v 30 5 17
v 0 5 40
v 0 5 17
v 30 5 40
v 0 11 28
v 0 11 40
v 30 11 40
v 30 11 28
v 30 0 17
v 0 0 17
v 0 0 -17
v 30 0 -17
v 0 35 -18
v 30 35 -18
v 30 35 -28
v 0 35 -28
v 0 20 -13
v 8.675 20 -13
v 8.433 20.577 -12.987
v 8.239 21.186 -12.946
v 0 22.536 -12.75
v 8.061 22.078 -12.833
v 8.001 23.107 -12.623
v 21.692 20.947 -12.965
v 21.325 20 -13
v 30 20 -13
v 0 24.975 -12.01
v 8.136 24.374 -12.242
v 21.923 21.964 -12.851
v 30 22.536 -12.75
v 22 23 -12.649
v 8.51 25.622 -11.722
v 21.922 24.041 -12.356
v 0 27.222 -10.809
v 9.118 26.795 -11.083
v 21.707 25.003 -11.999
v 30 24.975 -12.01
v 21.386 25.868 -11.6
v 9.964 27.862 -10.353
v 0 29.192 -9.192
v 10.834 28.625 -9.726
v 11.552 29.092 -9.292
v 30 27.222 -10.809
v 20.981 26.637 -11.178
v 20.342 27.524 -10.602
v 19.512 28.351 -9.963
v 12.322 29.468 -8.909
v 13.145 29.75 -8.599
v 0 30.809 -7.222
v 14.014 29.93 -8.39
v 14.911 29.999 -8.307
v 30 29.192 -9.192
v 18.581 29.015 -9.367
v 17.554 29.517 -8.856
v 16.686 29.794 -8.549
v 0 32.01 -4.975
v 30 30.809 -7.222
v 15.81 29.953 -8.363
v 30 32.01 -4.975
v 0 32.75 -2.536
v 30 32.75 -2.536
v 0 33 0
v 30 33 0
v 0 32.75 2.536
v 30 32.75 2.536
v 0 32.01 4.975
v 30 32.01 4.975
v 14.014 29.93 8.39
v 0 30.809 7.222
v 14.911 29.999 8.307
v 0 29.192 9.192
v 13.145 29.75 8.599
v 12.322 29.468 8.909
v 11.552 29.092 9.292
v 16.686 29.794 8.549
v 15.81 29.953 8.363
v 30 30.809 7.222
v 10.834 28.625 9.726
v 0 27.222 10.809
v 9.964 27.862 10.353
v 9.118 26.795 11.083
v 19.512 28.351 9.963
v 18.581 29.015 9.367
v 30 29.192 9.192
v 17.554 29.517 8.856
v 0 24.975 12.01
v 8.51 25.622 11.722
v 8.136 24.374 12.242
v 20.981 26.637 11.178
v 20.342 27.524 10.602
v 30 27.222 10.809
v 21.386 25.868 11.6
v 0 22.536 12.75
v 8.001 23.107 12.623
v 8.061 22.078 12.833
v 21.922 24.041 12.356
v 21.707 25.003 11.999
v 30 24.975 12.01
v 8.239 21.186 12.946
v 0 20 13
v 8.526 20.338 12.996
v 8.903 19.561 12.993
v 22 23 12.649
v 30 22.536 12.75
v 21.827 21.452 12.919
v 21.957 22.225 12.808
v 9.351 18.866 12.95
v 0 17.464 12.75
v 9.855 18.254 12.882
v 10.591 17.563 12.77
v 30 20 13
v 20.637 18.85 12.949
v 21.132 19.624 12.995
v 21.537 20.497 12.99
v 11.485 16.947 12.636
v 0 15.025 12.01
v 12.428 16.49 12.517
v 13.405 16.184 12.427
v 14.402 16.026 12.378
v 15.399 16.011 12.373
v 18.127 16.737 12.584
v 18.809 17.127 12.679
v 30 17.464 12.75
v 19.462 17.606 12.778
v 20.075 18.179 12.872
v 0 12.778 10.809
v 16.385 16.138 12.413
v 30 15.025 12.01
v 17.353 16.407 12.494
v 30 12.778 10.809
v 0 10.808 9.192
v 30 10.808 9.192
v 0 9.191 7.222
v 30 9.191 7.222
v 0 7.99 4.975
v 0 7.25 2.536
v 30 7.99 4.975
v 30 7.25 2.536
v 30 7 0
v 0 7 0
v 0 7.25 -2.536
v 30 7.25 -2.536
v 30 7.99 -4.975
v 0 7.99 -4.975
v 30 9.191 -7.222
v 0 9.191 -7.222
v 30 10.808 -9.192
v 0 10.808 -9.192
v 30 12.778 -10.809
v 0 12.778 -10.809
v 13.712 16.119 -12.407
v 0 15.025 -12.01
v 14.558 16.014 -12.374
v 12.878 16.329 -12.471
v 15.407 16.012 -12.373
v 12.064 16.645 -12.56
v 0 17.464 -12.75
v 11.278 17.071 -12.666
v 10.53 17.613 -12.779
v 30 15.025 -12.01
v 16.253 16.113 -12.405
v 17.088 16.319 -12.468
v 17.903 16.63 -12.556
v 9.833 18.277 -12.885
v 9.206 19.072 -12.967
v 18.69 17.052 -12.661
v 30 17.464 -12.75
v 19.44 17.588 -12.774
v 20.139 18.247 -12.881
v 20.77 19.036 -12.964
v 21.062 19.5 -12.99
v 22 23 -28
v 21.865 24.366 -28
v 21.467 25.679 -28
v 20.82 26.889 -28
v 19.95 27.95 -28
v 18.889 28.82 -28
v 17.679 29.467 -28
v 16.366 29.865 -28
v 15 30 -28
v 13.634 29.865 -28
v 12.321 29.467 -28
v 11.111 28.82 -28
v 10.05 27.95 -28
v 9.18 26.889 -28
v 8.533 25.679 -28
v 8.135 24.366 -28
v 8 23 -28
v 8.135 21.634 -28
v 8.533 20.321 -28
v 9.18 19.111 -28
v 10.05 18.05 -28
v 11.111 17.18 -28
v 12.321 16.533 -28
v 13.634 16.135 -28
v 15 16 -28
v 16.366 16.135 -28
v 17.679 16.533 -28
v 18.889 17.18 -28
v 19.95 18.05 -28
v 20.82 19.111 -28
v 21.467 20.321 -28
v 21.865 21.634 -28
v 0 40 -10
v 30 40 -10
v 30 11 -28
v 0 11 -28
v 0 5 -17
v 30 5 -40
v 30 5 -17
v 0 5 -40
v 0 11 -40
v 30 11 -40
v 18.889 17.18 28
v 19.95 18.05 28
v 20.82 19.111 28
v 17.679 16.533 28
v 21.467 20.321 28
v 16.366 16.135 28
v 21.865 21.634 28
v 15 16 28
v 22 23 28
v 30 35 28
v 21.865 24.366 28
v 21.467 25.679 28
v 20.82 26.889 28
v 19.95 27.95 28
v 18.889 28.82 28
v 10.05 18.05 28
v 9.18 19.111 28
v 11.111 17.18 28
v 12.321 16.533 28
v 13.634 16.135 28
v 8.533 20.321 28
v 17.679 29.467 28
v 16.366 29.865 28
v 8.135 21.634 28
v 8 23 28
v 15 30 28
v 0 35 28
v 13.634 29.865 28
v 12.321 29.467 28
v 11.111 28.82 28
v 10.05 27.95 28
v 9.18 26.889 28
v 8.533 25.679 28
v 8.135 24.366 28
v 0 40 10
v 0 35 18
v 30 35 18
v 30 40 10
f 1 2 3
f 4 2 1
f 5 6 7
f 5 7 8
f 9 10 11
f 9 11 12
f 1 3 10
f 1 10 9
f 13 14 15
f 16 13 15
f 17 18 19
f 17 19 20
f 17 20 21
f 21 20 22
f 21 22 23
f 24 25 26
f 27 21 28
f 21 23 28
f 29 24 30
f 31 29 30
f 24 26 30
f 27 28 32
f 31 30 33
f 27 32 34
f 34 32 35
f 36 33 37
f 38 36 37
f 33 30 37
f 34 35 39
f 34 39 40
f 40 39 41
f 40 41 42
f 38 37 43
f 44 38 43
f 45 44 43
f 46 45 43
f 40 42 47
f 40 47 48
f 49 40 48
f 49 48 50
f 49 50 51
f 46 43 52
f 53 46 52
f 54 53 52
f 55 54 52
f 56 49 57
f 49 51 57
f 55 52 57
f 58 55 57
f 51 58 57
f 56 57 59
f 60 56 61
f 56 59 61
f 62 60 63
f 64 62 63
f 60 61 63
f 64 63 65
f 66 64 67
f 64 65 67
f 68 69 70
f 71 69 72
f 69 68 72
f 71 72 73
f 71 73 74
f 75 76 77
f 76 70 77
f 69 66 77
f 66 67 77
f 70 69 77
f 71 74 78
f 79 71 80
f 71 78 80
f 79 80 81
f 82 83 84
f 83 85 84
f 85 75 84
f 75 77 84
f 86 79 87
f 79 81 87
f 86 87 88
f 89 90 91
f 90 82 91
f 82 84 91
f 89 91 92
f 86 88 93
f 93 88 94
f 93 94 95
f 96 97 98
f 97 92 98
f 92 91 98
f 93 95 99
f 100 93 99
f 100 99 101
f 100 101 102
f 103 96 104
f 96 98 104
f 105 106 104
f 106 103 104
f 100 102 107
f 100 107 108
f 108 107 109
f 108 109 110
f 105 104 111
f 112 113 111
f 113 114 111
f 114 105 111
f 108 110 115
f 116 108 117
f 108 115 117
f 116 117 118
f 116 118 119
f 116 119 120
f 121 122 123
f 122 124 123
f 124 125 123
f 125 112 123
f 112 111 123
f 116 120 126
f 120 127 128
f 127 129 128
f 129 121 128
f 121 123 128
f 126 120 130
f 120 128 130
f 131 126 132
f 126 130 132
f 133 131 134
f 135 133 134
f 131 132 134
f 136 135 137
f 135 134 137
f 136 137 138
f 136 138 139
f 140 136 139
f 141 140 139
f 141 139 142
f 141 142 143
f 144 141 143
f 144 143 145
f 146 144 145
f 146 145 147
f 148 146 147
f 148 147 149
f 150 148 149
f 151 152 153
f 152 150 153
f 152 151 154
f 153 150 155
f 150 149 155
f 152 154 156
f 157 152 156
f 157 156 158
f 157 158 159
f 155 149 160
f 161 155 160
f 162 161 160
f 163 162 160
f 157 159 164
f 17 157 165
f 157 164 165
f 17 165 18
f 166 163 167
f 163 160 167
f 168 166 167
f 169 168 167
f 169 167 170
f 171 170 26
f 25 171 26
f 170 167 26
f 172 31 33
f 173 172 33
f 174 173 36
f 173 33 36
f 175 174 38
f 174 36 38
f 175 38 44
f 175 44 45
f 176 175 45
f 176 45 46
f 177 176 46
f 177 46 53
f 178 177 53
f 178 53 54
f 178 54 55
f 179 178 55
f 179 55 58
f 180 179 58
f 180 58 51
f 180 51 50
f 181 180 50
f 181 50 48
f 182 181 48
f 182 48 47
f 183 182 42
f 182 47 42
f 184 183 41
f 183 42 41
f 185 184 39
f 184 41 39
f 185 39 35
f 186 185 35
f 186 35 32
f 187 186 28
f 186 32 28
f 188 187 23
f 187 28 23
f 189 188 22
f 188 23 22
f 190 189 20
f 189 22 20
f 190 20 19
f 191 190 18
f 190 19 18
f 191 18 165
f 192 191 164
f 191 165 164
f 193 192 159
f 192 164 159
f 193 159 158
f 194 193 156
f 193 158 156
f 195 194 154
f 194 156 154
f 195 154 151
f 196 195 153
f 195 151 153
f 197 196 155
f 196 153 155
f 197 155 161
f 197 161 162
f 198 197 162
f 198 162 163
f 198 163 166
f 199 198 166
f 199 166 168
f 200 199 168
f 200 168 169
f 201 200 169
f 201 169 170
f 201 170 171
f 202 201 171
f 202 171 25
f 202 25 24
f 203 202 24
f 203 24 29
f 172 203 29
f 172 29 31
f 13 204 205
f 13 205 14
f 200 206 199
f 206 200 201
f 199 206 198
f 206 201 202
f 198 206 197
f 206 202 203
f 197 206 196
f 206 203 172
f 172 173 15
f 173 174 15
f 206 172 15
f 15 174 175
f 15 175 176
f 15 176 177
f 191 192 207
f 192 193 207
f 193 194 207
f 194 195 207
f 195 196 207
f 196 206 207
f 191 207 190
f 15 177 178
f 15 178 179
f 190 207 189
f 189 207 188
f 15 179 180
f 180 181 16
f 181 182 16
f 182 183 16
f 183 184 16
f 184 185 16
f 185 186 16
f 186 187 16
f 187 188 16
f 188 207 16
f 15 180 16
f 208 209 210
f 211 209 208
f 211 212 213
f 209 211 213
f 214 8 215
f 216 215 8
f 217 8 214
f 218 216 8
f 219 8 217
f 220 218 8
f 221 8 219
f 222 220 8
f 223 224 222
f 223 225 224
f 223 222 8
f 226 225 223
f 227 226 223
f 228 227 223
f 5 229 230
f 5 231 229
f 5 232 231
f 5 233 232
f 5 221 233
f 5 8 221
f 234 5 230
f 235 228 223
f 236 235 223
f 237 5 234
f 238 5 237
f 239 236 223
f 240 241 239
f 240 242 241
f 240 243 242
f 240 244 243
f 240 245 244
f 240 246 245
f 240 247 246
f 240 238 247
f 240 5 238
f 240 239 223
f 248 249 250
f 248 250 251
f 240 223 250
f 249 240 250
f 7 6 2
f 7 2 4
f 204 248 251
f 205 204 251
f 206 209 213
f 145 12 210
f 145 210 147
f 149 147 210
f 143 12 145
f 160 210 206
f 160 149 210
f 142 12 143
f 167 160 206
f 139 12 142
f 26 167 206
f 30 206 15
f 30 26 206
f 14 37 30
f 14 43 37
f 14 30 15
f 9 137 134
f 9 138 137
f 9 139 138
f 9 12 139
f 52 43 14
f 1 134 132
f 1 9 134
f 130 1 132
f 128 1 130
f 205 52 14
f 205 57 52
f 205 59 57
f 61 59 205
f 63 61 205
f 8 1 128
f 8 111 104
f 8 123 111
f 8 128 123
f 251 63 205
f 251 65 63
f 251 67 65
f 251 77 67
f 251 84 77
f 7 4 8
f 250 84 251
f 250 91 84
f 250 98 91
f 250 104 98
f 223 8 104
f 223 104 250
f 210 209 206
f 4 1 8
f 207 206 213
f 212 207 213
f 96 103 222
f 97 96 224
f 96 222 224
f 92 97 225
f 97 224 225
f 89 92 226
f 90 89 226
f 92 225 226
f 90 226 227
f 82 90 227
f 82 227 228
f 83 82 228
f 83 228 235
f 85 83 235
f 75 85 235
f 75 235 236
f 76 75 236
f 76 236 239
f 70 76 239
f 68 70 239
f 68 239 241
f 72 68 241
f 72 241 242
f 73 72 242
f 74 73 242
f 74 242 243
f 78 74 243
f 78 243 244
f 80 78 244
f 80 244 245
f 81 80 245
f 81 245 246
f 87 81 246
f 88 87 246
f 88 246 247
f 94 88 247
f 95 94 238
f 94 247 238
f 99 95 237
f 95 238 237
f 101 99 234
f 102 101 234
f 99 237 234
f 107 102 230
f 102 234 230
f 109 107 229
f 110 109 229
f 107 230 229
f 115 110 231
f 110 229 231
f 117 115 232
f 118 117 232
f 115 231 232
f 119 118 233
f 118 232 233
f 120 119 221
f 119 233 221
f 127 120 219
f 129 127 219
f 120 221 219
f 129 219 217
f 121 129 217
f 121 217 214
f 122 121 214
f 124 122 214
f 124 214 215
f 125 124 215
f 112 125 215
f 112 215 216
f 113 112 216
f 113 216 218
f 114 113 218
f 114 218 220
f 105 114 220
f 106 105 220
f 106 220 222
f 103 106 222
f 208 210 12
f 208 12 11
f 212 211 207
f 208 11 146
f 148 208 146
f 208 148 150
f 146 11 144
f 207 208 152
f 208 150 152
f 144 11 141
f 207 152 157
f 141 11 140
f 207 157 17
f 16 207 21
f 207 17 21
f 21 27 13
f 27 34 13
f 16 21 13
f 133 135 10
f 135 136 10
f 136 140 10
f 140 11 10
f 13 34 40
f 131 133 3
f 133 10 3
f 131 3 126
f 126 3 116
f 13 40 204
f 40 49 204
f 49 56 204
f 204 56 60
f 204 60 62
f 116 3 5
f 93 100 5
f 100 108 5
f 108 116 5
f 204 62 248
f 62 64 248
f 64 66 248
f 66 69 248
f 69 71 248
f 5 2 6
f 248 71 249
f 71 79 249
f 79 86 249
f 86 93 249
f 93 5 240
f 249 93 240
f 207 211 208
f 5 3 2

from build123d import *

# Parameters (mm, degrees)
SKETCH1_W           = 30
SKETCH1_H           = 40
BOSS_EXTRUDE1_DEPTH = 40
SKETCH2_W           = 30
SKETCH2_H           = 5
CUT_EXTRUDE1_DEPTH  = 23
SKETCH3_W           = 30
SKETCH3_H           = 5
CUT_EXTRUDE2_DEPTH  = 23
SKETCH5_W           = 12
SKETCH5_H           = 29
CUT_EXTRUDE3_DEPTH  = 65.031242374
CUT_EXTRUDE4_DEPTH  = 65.031242374
SKETCH7_R           = 13
CUT_EXTRUDE5_DEPTH  = 65.031242374
SKETCH8_R           = 7
CUT_EXTRUDE6_DEPTH  = 85.403791384


with BuildPart() as part:
    # Sketch1 → Boss-Extrude1 (new, symmetric)
    with BuildSketch(Plane.XY):
        with Locations((15, 20)):
            Rectangle(SKETCH1_W, SKETCH1_H)
    extrude(amount=BOSS_EXTRUDE1_DEPTH, both=True)

    # Sketch2 → Cut-Extrude1 (cut)
    with BuildSketch(Plane.XY.offset(40)):
        with Locations((15, 2.5)):
            Rectangle(SKETCH2_W, SKETCH2_H)
    extrude(amount=-CUT_EXTRUDE1_DEPTH, mode=Mode.SUBTRACT)

    # Sketch3 → Cut-Extrude2 (cut)
    with BuildSketch(Plane(origin=(0, 0, -40), x_dir=(-1, 0, 0), z_dir=(0, 0, -1))):
        with Locations((-15, 2.5)):
            Rectangle(SKETCH3_W, SKETCH3_H)
    extrude(amount=-CUT_EXTRUDE2_DEPTH, mode=Mode.SUBTRACT)

    # Sketch5 → Cut-Extrude3 (cut, through all)
    with BuildSketch(Plane(origin=(0, 0, 0), x_dir=(0, 0, -1), z_dir=(1, 0, 0))):
        with Locations((-34, 25.5)):
            Rectangle(SKETCH5_W, SKETCH5_H)
        with Locations((34, 25.5)):
            Rectangle(SKETCH5_W, SKETCH5_H)
    extrude(amount=CUT_EXTRUDE3_DEPTH, mode=Mode.SUBTRACT)

    # Sketch6 → Cut-Extrude4 (cut, through all)
    with BuildSketch(Plane(origin=(30, 0, 0), x_dir=(0, 0, -1), z_dir=(1, 0, 0))):
        Polygon((-28, 35), (-18, 35), (-10, 40), (-28, 40), align=None)
        Polygon((10, 40), (18, 35), (28, 35), (28, 40), align=None)
    extrude(amount=-CUT_EXTRUDE4_DEPTH, mode=Mode.SUBTRACT)

    # Sketch7 → Cut-Extrude5 (cut, through all)
    with BuildSketch(Plane(origin=(30, 0, 0), x_dir=(0, 0, -1), z_dir=(1, 0, 0))):
        with Locations((0, 20)):
            Circle(SKETCH7_R)
    extrude(amount=-CUT_EXTRUDE5_DEPTH, mode=Mode.SUBTRACT)

    # Sketch8 → Cut-Extrude6 (cut, through all)
    with BuildSketch(Plane.XY.offset(28)):
        with Locations((15, 23)):
            Circle(SKETCH8_R)
    extrude(amount=-CUT_EXTRUDE6_DEPTH, mode=Mode.SUBTRACT)


solid = part.part
